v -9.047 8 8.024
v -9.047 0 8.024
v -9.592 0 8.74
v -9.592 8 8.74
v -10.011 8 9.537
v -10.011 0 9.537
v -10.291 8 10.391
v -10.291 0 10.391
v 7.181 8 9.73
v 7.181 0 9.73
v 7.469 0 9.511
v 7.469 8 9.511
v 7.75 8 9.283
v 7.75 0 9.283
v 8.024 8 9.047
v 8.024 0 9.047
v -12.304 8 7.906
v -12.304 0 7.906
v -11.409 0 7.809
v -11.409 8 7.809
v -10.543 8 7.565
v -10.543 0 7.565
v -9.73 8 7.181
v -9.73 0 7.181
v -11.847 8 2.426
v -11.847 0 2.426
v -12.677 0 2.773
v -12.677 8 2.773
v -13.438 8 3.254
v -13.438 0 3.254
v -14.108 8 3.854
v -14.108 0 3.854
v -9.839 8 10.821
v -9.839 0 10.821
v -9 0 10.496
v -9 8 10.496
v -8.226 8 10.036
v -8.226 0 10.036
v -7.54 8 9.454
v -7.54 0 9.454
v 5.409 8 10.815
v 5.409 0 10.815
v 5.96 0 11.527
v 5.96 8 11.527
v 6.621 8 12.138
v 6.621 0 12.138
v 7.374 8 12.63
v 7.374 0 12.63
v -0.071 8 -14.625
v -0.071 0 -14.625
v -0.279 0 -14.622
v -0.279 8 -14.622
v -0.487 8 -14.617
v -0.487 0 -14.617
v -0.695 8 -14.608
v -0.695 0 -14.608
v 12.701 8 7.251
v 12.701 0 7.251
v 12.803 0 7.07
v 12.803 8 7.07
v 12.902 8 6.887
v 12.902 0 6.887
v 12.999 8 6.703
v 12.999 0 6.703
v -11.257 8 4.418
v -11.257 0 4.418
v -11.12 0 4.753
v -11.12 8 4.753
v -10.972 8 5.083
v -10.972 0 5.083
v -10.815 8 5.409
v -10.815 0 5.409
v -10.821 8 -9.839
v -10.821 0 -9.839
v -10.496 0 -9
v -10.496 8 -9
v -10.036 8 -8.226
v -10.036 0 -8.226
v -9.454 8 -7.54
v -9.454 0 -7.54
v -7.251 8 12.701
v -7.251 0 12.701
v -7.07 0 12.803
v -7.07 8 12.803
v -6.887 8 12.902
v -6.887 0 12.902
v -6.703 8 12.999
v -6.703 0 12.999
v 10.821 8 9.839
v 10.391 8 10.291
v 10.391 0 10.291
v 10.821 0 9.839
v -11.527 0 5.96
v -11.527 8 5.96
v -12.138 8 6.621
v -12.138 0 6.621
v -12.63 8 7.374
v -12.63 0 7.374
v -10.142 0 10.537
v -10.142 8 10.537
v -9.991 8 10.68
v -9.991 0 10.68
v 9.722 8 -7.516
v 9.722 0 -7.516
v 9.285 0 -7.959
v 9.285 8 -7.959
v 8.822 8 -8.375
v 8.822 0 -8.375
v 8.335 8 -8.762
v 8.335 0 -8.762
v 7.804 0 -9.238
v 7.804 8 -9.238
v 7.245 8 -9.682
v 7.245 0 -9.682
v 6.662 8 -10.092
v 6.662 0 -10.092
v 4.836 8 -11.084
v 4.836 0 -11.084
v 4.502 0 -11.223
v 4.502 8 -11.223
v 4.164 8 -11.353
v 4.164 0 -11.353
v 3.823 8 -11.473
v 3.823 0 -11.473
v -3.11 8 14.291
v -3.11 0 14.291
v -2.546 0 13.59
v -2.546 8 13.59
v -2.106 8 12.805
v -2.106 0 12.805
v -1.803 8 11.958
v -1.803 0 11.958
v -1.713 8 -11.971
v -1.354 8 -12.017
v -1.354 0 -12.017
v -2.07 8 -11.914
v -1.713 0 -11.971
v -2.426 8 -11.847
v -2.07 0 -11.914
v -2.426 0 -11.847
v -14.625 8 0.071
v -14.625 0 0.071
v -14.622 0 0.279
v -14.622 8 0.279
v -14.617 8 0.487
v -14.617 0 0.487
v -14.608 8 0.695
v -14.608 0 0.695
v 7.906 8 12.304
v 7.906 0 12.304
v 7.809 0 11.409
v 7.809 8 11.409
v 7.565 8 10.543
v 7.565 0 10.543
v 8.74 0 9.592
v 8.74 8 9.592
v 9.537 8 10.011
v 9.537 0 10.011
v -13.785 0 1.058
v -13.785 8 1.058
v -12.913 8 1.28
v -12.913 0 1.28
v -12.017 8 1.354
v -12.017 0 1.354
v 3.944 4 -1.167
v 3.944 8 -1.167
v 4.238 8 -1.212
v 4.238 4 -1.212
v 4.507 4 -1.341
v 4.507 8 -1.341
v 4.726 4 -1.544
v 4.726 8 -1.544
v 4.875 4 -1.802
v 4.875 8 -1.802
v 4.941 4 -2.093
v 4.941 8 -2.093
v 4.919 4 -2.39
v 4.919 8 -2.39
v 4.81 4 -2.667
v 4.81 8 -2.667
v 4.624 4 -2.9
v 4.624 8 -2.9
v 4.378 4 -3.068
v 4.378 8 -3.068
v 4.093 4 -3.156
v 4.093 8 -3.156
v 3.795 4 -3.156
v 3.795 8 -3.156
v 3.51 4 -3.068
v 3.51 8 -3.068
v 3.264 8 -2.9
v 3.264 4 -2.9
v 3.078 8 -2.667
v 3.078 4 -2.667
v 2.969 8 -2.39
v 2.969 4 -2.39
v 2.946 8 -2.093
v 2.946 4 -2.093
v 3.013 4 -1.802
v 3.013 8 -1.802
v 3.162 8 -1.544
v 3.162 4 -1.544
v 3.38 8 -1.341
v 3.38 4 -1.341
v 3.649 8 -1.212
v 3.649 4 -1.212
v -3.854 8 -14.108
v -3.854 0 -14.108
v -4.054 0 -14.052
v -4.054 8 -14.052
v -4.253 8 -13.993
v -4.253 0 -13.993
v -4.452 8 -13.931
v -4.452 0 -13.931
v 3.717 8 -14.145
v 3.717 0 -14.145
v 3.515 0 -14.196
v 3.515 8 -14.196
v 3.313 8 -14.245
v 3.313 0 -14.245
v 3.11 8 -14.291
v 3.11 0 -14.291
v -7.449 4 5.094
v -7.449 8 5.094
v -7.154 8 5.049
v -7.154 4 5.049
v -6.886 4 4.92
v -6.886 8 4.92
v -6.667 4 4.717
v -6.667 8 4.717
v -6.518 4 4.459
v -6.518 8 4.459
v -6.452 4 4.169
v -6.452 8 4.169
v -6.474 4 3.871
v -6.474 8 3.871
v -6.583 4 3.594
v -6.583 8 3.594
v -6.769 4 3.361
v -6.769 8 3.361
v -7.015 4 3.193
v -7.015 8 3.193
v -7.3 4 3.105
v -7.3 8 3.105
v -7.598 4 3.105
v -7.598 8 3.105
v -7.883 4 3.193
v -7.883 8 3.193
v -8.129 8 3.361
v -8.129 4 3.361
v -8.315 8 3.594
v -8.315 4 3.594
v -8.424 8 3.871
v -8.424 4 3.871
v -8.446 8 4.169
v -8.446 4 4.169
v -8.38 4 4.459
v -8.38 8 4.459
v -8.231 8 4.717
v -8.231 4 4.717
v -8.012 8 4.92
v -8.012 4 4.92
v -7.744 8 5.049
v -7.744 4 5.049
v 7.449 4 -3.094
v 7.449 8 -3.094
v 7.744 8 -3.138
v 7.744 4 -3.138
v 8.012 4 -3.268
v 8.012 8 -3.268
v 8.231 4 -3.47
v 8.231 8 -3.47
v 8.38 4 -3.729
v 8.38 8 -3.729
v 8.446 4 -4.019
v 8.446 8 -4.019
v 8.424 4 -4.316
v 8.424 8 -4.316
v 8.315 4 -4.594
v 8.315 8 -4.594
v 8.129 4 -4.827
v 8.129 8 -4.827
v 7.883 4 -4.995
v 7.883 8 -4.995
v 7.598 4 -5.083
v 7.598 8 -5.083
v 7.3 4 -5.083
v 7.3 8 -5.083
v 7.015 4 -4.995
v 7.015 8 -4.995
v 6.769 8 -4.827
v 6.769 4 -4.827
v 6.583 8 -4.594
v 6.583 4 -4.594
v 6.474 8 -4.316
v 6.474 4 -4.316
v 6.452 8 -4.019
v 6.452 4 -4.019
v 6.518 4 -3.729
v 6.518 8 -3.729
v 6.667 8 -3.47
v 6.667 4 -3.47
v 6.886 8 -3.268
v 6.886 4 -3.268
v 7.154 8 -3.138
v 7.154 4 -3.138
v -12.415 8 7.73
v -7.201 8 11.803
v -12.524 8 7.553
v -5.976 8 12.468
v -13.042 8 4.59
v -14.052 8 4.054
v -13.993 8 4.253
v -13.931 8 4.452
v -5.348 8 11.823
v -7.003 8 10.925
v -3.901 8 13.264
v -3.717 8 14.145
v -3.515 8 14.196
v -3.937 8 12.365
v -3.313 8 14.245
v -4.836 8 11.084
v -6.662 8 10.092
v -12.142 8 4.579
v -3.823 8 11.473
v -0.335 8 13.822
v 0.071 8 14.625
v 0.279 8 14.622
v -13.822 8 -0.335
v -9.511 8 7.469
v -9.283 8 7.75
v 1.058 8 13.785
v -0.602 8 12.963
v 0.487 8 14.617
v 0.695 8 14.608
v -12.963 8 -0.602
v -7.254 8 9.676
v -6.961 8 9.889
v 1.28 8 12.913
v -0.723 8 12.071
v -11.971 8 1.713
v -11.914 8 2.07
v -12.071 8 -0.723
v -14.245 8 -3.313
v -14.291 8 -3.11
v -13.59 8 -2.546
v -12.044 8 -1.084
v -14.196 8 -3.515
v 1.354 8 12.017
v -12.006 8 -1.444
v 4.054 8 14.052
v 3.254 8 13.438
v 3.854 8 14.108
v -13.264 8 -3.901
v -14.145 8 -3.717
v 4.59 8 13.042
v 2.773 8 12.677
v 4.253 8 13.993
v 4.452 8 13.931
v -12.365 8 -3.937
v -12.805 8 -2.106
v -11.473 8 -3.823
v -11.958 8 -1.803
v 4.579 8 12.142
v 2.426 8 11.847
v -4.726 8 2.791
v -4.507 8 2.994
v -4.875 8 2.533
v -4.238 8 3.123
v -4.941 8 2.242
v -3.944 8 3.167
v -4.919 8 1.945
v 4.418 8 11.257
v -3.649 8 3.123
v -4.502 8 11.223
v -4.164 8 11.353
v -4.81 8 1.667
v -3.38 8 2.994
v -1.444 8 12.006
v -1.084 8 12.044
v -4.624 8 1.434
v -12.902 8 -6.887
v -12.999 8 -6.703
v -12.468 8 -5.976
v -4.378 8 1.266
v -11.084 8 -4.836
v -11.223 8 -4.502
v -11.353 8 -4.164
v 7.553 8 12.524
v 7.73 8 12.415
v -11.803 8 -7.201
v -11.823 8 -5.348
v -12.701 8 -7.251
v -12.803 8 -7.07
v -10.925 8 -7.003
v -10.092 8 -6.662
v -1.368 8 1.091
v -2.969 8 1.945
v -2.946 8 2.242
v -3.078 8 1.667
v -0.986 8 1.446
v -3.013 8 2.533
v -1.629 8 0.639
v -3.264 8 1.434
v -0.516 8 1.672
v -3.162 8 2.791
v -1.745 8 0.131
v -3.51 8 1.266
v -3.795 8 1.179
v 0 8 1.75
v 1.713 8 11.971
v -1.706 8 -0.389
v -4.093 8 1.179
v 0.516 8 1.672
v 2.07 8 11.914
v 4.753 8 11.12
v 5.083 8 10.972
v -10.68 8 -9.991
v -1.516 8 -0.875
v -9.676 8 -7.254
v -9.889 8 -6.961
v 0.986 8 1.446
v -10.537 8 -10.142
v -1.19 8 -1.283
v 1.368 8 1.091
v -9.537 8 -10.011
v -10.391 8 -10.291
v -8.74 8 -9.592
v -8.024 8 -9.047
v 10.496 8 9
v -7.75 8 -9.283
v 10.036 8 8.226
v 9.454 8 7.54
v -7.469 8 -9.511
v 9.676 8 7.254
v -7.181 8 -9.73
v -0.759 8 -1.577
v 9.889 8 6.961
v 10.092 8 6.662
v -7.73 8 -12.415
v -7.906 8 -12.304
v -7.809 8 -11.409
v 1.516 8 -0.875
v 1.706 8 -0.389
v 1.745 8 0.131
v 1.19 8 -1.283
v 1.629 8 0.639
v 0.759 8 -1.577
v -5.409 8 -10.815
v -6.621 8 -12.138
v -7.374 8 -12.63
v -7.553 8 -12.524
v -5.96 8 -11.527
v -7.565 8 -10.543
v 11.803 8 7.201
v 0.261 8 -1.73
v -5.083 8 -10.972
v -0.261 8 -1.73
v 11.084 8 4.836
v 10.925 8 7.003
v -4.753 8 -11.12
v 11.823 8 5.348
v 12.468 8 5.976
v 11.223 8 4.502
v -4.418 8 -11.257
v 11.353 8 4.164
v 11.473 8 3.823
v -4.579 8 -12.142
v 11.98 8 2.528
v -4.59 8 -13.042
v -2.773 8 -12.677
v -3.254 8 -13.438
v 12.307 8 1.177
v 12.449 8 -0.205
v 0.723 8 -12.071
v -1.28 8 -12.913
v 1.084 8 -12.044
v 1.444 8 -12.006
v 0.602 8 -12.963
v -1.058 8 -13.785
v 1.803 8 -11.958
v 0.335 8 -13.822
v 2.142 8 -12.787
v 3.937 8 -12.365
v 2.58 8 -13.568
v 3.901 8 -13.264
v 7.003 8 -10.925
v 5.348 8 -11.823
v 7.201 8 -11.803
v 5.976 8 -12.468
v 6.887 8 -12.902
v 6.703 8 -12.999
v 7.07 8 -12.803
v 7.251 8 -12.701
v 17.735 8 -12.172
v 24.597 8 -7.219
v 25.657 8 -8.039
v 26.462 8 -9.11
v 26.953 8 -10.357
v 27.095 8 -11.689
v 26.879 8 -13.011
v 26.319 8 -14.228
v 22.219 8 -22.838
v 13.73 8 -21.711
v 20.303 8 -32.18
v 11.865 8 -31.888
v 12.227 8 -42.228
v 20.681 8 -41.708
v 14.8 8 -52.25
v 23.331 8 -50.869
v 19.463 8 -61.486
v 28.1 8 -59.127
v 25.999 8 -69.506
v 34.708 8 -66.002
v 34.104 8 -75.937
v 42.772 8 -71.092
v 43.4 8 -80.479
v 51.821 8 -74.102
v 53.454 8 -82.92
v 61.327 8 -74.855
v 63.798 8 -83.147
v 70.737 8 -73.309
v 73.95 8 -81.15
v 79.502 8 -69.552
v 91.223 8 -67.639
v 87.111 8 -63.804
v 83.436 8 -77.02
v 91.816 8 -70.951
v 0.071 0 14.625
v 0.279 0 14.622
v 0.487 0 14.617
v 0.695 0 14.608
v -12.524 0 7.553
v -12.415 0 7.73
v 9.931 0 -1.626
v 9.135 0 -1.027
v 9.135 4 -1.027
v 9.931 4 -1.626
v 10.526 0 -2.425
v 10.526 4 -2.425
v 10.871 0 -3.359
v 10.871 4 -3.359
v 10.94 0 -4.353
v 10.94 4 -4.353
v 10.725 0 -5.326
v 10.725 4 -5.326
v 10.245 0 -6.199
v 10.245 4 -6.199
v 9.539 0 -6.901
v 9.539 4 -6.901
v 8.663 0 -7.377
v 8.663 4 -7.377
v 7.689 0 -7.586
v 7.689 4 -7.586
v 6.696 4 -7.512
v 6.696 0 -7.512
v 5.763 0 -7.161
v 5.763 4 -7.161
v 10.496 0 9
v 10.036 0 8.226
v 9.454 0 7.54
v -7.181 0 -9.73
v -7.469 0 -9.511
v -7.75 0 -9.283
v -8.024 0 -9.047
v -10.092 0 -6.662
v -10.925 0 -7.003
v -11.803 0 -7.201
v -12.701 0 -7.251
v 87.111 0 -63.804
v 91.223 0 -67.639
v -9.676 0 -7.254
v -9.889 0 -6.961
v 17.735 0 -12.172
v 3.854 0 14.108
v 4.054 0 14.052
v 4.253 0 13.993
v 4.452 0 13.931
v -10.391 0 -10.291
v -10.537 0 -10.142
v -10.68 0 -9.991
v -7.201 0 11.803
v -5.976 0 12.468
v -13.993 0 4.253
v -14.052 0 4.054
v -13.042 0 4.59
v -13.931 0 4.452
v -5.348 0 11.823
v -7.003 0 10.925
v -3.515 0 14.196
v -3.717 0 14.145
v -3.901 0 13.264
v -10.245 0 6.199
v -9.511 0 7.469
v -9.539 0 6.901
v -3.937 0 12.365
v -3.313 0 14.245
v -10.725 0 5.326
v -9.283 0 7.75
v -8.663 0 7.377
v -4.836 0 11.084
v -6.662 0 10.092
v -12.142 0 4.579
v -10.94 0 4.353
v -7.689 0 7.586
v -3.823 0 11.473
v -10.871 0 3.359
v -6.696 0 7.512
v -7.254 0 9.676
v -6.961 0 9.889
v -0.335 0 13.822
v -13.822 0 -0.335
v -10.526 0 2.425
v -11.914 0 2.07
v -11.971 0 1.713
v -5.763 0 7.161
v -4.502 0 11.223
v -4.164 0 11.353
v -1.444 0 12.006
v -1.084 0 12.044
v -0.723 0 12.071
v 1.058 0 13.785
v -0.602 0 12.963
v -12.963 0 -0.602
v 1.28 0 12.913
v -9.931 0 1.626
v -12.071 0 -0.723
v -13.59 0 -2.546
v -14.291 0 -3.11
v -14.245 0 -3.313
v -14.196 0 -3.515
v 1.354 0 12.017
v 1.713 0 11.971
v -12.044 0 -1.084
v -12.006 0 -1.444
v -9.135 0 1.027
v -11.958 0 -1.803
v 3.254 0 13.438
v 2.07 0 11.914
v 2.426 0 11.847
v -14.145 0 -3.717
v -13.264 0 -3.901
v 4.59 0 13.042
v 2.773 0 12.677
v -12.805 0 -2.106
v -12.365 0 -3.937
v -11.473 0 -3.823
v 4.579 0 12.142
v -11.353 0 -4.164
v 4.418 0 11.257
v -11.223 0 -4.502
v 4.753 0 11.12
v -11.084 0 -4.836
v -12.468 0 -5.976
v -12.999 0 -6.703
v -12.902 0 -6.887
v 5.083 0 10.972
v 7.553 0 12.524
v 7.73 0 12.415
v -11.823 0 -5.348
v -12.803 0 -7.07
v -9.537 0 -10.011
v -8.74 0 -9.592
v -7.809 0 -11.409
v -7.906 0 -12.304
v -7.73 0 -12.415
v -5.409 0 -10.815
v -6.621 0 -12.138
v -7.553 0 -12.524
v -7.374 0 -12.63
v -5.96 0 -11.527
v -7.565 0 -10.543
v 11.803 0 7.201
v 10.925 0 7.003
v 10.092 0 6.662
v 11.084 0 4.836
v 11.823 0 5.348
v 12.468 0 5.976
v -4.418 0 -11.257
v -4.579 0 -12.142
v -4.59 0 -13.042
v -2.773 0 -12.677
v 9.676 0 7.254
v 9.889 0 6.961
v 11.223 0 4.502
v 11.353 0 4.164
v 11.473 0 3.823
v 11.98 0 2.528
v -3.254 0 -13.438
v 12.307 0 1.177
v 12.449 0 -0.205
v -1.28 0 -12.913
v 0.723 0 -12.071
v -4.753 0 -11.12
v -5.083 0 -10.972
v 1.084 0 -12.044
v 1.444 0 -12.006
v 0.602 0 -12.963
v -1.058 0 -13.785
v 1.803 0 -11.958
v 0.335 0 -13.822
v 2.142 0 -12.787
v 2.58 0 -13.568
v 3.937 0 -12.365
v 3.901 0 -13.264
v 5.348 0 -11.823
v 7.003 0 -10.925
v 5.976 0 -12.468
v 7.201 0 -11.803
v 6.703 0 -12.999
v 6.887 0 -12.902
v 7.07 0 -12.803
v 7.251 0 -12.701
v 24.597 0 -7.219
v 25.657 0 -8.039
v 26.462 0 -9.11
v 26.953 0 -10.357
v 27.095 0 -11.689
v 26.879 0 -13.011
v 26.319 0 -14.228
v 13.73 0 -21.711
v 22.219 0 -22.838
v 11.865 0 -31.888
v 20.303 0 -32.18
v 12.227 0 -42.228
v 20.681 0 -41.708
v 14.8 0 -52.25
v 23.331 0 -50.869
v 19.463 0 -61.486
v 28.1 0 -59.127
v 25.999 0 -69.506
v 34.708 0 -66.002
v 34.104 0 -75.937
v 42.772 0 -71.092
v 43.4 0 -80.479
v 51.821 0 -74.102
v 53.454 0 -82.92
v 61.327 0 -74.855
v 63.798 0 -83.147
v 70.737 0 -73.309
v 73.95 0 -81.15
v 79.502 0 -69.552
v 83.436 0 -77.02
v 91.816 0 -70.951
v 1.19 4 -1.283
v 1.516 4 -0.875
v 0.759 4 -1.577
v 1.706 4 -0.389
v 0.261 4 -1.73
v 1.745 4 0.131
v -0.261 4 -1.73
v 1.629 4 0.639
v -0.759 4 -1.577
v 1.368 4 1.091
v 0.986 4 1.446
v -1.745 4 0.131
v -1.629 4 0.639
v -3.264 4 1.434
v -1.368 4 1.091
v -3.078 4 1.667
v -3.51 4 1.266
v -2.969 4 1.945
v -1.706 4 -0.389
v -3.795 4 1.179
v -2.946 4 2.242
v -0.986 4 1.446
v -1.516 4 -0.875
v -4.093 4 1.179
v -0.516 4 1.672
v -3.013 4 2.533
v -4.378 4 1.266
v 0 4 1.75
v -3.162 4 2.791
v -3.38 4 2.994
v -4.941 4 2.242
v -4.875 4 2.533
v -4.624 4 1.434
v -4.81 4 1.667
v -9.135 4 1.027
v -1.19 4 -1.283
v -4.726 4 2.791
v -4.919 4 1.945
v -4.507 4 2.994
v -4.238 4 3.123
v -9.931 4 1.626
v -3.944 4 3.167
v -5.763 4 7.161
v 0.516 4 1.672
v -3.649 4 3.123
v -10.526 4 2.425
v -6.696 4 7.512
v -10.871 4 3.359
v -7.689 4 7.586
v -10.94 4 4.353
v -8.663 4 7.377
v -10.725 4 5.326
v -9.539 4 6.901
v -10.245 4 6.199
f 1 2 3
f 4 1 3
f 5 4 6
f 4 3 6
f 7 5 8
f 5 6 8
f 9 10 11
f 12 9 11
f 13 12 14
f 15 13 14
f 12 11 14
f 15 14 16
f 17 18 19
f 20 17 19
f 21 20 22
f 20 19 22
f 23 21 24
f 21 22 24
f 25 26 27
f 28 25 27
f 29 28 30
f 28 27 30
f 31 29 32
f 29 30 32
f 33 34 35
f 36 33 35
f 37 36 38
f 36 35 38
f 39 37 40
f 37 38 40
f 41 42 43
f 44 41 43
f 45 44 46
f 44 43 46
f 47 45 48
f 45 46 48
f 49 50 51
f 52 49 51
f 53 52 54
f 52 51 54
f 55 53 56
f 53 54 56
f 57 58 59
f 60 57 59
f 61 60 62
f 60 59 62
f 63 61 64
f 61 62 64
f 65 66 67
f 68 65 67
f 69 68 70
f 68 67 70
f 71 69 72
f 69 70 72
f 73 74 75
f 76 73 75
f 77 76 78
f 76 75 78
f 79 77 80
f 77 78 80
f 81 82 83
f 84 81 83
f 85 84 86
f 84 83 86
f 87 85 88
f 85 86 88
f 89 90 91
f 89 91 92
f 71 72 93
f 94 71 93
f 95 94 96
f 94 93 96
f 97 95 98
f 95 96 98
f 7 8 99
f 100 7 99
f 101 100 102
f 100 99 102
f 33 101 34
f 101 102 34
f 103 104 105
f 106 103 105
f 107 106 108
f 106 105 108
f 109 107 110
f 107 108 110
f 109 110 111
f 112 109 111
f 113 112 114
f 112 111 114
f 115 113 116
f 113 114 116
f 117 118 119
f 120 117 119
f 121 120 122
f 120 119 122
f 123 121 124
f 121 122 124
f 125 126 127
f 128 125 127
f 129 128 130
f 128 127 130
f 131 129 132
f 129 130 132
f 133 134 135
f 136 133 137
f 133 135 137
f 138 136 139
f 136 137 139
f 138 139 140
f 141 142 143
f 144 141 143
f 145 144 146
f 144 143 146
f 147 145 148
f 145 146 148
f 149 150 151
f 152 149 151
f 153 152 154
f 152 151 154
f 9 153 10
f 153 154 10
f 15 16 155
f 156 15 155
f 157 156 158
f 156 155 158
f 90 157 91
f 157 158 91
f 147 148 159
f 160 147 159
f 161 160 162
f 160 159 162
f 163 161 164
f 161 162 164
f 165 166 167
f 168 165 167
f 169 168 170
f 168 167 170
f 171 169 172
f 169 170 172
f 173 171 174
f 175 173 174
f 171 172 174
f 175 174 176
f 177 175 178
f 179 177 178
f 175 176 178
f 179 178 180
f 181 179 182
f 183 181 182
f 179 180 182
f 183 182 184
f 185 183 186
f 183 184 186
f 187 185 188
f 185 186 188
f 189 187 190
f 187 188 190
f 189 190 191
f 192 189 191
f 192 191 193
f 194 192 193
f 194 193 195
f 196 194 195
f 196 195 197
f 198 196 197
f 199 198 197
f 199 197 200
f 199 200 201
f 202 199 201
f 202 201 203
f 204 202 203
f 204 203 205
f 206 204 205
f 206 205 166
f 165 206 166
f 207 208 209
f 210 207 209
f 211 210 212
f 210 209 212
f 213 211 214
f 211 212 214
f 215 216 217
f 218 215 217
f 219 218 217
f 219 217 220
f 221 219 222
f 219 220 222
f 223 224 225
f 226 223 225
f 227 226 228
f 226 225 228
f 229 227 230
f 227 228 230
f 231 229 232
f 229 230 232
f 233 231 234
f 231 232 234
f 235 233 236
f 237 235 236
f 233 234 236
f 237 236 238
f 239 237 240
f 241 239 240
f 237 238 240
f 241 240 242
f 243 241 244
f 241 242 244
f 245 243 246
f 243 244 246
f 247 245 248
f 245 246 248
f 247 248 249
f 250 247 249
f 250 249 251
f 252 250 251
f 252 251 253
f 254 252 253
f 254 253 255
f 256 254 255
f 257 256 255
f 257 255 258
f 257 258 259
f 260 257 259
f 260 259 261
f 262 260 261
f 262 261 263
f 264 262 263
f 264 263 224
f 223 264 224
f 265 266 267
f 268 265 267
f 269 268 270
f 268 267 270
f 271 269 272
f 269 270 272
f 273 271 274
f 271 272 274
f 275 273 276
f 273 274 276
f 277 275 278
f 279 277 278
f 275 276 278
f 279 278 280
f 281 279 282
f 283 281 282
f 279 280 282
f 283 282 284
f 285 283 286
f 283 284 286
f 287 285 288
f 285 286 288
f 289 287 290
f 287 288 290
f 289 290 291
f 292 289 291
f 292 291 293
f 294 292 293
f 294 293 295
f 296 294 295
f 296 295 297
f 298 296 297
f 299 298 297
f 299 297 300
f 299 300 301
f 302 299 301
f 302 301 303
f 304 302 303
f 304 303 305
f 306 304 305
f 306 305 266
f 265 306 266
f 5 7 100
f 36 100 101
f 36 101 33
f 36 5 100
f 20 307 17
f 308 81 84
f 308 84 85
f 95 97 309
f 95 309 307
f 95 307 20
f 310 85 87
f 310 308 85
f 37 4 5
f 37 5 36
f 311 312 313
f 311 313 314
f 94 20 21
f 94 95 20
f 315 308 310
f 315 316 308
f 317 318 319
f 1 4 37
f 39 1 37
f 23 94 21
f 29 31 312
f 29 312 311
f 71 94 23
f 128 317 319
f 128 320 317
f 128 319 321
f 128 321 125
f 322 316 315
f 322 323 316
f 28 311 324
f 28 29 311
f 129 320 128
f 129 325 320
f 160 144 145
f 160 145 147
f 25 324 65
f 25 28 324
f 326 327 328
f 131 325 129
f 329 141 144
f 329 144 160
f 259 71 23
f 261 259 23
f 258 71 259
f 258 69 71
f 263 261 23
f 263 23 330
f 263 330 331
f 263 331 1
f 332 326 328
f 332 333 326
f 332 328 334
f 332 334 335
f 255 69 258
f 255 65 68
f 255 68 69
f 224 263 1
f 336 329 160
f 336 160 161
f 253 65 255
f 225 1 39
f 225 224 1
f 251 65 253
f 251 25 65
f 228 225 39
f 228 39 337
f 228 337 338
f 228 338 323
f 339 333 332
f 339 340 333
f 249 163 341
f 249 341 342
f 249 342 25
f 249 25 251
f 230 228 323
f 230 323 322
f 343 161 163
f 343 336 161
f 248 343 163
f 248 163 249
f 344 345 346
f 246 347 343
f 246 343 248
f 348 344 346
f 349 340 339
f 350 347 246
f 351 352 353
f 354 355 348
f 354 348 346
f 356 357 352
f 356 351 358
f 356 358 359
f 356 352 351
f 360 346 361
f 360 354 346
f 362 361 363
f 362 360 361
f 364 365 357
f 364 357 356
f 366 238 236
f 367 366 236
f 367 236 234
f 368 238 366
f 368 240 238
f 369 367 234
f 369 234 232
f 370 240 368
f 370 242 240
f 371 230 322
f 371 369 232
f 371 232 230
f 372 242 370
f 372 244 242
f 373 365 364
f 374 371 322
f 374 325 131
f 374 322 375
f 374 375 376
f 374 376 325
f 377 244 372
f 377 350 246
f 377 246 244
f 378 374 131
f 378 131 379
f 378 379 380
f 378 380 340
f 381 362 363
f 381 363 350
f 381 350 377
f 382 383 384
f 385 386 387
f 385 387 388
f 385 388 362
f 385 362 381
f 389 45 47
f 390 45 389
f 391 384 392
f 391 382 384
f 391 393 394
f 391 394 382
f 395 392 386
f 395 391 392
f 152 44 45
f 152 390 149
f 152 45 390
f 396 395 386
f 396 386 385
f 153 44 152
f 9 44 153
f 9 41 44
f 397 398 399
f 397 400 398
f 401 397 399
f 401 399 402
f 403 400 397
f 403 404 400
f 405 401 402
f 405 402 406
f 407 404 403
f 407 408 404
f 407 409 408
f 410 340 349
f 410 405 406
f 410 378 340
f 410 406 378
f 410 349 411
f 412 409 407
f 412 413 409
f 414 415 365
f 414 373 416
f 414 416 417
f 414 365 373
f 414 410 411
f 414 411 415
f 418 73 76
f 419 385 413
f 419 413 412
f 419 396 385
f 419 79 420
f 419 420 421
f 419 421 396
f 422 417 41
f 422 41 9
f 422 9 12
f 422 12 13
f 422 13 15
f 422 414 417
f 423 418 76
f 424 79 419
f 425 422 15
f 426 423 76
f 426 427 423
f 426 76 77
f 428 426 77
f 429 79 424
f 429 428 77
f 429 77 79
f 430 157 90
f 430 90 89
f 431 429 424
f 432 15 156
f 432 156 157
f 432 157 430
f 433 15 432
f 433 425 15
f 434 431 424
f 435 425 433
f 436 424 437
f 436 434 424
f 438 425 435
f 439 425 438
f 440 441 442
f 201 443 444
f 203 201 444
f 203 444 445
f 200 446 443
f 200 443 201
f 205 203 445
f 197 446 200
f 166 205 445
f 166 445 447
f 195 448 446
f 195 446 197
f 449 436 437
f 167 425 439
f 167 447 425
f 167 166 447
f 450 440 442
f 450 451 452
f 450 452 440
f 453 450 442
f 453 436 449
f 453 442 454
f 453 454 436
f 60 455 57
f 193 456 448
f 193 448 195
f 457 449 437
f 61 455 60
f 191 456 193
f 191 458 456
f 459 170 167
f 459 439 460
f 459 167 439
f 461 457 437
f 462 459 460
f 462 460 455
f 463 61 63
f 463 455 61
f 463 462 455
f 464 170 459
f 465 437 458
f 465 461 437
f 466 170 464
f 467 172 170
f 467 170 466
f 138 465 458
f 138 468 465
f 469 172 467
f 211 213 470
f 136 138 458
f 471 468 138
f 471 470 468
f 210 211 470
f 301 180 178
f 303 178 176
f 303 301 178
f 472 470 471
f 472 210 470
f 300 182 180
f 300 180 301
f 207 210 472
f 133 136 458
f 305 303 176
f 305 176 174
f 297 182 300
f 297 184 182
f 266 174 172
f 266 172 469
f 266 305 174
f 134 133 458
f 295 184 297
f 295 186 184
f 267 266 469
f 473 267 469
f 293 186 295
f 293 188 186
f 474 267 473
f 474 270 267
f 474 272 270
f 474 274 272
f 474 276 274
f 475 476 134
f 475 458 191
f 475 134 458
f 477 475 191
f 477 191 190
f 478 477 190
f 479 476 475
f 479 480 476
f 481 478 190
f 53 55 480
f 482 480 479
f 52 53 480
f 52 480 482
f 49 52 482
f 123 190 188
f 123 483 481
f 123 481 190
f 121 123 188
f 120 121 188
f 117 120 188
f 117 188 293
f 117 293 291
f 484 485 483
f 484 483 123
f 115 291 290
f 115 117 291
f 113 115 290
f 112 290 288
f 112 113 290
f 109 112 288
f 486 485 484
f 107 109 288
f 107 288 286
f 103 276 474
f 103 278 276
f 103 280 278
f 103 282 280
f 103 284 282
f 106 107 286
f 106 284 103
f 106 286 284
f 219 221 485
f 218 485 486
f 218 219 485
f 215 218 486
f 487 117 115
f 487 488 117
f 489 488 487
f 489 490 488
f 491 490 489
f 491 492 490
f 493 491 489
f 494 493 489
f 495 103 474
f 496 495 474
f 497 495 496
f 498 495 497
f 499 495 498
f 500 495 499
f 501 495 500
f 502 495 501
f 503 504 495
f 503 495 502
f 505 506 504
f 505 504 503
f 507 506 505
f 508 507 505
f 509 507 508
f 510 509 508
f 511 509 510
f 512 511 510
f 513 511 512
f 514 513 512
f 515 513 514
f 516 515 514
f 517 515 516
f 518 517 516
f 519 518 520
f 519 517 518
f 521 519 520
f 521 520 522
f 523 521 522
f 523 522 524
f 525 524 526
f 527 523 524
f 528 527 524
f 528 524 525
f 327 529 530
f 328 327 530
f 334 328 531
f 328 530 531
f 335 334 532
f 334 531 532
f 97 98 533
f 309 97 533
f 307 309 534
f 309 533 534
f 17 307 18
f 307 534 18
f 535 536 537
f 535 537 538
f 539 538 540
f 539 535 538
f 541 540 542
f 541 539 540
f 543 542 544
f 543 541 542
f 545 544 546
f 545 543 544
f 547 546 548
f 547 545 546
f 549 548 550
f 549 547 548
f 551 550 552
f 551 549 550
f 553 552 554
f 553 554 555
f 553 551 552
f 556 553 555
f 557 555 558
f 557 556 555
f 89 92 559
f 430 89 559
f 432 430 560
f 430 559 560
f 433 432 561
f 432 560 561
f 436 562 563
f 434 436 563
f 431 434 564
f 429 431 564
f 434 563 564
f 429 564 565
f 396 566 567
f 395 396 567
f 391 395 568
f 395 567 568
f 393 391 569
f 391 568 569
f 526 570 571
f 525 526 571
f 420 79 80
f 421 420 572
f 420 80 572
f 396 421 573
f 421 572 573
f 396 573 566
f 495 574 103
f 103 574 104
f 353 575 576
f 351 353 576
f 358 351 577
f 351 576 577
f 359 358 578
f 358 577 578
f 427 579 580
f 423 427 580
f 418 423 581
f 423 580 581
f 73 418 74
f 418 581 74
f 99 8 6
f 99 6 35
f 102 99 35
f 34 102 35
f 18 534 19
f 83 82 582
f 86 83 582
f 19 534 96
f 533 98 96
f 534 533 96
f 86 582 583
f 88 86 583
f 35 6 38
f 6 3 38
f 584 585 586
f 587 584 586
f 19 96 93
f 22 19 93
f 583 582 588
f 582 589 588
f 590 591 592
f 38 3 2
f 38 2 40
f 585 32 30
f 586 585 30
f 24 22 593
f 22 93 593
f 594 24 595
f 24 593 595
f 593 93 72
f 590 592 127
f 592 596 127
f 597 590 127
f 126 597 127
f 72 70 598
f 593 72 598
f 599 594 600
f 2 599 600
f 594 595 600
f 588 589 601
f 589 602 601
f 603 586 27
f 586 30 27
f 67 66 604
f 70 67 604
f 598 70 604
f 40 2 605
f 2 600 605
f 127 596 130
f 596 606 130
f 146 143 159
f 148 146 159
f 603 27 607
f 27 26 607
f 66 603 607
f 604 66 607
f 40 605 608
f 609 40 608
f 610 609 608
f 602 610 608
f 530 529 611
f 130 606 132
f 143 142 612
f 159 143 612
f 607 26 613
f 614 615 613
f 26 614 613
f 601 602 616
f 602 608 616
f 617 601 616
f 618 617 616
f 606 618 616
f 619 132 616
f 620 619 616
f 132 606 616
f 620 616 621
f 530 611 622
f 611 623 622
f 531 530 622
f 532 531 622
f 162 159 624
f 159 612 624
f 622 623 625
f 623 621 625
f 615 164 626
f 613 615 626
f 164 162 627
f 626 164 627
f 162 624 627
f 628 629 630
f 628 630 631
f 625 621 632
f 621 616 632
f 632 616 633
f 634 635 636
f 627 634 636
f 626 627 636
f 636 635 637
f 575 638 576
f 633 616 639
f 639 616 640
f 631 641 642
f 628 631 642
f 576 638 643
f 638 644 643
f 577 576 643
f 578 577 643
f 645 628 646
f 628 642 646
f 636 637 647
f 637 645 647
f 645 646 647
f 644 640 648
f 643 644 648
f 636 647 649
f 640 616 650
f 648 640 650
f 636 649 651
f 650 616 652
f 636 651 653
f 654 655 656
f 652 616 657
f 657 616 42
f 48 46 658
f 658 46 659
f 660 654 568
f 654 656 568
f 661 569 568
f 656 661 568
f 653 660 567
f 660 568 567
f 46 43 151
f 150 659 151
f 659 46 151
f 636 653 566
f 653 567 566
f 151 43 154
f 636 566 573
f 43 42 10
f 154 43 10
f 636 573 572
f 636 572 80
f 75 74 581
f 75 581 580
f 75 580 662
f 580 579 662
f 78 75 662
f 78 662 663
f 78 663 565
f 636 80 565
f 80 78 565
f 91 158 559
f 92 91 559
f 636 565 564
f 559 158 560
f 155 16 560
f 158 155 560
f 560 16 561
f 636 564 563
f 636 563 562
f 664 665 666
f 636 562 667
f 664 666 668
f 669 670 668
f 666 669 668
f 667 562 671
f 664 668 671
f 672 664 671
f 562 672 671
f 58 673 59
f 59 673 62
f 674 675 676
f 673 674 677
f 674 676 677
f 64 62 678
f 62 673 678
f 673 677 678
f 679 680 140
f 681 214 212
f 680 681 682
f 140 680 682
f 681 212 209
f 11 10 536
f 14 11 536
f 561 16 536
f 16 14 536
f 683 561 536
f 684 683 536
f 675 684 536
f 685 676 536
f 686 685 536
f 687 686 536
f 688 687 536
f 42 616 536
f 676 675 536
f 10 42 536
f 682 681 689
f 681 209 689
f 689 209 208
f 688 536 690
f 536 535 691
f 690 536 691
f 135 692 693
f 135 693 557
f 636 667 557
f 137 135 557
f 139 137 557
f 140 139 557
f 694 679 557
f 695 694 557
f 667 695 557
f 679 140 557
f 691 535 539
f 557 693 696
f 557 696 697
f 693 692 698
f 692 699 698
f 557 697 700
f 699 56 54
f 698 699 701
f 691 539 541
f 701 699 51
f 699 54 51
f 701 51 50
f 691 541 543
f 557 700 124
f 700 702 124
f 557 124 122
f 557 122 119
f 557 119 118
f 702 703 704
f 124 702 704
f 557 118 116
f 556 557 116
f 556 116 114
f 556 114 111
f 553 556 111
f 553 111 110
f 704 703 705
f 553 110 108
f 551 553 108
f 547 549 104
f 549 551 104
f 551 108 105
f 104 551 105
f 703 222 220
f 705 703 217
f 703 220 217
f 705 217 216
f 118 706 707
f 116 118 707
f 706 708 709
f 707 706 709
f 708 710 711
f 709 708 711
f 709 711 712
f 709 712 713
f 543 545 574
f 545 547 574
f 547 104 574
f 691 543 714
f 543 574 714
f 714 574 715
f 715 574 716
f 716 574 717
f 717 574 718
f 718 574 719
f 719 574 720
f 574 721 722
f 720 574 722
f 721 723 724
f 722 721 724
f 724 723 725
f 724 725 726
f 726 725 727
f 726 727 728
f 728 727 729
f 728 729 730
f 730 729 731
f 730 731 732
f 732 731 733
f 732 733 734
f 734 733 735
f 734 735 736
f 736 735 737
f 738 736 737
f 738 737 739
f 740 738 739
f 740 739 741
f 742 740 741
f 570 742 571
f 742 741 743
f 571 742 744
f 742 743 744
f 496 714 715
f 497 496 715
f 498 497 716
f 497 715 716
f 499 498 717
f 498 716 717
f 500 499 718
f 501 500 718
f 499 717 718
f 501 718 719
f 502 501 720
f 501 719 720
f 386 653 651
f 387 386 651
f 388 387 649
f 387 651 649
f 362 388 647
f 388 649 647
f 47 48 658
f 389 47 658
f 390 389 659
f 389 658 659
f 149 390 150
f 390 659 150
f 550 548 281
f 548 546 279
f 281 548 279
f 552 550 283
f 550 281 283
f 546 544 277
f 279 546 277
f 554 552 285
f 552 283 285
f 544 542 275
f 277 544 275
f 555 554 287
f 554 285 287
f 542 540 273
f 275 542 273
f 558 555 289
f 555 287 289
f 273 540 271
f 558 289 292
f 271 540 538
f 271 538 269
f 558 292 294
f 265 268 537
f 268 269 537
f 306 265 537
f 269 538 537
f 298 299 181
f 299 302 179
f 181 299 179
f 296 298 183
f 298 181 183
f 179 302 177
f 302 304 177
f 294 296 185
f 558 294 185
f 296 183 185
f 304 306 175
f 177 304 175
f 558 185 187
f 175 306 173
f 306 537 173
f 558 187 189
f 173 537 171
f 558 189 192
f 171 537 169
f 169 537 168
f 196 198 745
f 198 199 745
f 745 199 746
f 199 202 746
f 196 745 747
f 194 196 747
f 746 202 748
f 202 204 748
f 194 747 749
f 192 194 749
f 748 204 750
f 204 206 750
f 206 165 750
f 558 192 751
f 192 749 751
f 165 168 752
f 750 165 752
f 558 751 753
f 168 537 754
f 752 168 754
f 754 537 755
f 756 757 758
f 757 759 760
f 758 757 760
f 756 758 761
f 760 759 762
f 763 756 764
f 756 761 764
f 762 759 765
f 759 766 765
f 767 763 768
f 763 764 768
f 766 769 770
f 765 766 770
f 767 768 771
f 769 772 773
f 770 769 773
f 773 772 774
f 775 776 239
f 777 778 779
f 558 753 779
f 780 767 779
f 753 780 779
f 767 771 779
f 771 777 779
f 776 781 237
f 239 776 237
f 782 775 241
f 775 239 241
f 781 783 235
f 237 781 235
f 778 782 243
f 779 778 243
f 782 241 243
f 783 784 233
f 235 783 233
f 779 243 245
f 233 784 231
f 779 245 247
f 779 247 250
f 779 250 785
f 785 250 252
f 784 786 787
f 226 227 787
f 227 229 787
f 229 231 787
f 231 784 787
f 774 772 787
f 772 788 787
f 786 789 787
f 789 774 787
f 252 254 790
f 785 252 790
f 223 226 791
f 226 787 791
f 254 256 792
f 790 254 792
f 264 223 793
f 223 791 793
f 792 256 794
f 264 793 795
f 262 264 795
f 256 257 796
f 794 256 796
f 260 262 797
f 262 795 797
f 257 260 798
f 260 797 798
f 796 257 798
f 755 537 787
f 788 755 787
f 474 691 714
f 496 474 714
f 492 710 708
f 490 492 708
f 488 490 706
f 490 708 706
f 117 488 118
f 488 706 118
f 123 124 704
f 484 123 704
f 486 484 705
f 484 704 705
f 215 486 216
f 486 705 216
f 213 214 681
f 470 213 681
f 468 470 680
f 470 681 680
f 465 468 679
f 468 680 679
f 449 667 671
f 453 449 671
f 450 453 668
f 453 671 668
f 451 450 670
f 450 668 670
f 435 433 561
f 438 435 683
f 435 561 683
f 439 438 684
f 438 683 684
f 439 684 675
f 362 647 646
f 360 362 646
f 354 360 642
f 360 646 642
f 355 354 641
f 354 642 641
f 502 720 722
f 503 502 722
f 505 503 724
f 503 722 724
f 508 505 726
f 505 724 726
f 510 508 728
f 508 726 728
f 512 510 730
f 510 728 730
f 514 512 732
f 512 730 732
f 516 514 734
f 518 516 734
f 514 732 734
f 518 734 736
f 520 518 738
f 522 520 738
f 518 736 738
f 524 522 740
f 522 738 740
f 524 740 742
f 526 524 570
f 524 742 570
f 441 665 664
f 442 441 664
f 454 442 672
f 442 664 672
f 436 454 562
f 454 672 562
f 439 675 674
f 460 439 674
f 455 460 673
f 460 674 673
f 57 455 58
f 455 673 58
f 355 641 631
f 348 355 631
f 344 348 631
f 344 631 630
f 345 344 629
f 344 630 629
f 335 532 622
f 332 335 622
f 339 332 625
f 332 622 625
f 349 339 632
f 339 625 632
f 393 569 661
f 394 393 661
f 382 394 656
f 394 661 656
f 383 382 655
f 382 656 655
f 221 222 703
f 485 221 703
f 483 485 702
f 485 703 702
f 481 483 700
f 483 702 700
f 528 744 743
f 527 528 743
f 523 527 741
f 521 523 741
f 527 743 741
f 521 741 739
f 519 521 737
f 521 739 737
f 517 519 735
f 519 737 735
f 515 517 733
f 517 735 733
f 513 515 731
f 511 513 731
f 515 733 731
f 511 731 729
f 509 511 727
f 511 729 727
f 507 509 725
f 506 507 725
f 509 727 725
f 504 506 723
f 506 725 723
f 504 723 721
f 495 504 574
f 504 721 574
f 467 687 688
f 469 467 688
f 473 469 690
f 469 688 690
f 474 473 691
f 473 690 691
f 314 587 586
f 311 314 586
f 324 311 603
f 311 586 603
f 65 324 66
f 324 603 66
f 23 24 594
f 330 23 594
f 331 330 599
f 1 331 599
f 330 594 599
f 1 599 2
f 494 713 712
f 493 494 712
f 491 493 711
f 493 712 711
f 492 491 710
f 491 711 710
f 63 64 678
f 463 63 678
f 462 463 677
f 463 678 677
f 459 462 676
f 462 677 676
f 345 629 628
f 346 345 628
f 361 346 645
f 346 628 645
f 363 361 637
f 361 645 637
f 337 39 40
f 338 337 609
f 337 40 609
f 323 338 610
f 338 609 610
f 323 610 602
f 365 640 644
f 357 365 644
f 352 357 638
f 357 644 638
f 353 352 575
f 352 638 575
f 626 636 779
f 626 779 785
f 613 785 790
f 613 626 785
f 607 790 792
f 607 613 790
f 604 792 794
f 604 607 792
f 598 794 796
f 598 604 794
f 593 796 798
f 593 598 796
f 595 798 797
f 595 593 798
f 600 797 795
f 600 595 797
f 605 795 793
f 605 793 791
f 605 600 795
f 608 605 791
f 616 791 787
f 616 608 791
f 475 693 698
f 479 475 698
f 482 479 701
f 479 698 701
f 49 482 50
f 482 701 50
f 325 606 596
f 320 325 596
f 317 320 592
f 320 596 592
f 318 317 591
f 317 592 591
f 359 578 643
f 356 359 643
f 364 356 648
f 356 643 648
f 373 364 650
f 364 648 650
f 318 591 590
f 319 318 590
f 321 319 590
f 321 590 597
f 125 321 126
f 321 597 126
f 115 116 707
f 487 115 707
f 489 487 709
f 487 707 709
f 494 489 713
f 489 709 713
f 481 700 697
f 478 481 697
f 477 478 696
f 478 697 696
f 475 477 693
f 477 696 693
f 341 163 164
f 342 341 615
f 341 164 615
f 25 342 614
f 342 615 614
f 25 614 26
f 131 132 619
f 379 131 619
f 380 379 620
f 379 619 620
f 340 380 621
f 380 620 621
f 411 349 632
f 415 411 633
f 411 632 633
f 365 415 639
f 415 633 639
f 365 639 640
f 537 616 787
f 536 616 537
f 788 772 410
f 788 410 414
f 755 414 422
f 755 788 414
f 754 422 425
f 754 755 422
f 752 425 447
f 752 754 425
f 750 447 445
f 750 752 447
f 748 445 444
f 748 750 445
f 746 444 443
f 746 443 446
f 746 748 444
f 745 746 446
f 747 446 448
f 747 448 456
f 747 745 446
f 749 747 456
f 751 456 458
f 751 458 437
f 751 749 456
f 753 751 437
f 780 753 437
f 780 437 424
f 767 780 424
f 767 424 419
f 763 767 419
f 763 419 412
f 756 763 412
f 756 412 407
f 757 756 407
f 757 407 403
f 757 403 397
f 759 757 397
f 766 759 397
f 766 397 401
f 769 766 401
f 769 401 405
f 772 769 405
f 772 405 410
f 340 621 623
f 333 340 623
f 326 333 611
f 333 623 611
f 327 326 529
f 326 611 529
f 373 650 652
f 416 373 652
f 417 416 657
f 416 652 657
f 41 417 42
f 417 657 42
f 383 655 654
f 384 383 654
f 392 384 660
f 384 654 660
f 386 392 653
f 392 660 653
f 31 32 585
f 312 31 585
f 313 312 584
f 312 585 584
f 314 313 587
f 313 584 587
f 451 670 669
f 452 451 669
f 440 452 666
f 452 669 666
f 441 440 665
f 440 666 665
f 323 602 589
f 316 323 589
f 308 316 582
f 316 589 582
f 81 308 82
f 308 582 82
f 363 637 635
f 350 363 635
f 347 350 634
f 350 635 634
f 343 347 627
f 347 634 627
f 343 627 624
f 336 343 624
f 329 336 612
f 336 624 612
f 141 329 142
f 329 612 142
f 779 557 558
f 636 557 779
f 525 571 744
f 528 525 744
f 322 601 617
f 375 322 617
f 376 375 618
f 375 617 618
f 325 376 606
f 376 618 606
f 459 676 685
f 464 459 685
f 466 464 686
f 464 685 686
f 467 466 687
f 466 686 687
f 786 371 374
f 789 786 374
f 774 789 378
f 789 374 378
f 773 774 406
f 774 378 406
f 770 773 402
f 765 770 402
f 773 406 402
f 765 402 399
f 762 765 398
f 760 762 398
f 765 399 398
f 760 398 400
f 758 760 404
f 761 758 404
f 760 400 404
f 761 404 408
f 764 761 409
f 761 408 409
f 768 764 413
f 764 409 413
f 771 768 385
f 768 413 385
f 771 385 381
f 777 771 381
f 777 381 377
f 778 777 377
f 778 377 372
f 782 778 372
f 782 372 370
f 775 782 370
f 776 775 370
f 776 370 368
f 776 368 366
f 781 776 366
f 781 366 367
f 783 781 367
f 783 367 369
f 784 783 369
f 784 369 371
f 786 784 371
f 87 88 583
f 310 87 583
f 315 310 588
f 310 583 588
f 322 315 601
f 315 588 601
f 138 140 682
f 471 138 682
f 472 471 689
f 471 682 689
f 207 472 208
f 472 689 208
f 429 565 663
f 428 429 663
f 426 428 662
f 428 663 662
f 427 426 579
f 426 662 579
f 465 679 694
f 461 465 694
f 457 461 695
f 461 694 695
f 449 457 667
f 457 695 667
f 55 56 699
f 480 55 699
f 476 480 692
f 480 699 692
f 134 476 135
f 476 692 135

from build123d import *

# Parameters (mm, degrees)
CROQUIS3_R              = 1.75
SALIENTE_EXTRUIR2_DEPTH = 8
CROQUIS4_R              = 1
CORTAR_EXTRUIR1_DEPTH   = 8
CORTAR_EXTRUIR2_DEPTH   = 4


with BuildPart() as part:
    # Croquis3 → Saliente-Extruir2 (new body)
    with BuildSketch(Plane(origin=(0, 0, 0), x_dir=(1, 0, 0), z_dir=(0, 1, 0))):
        with BuildLine():
            Line((87.111019212, 63.804032696), (91.223264764, 67.638763711))
            Line((91.223264764, 67.638763711), (91.815621149, 70.950831381))
            ThreePointArc((91.815621149, 70.950831381), (29.87732987, 72.940785596), (17.735388738, 12.171672472))
            Line((17.735388738, 12.171672472), (9.721894551, 7.515983209))
            ThreePointArc((9.721894551, 7.515983209), (9.056743368, 8.17044576), (8.33477019, 8.76163275))
            ThreePointArc((8.33477019, 8.76163275), (7.527702463, 9.464052948), (6.66170644, 10.092386728))
            ThreePointArc((6.66170644, 10.092386728), (7.120443737, 11.359558341), (7.251125308, 12.700858505))
            ThreePointArc((7.251125308, 12.700858505), (6.978446869, 12.852700273), (6.702590326, 12.9986887))
            ThreePointArc((6.702590326, 12.9986887), (5.648855639, 12.158565486), (4.835962342, 11.083684892))
            ThreePointArc((4.835962342, 11.083684892), (4.333654022, 11.289554703), (3.822612402, 11.472673489))
            ThreePointArc((3.822612402, 11.472673489), (3.937750458, 12.815397225), (3.716825134, 14.144816574))
            ThreePointArc((3.716825134, 14.144816574), (3.414138446, 14.220910086), (3.109896902, 14.290527151))
            ThreePointArc((3.109896902, 14.290527151), (2.349191787, 13.184063868), (1.802512181, 11.957656643))
            ThreePointArc((1.802512181, 11.957656643), (1.264036574, 12.02650465), (0.723013645, 12.071116511))
            ThreePointArc((0.723013645, 12.071116511), (0.486705992, 13.397887968), (-0.07077053, 14.624828769))
            ThreePointArc((-0.07077053, 14.624828769), (-0.382837869, 14.619988378), (-0.694730857, 14.608489793))
            ThreePointArc((-0.694730857, 14.608489793), (-1.187230257, 13.354054404), (-1.353776206, 12.016733855))
            ThreePointArc((-1.353776206, 12.016733855), (-1.891722877, 11.943868181), (-2.425857296, 11.846932892))
            ThreePointArc((-2.425857296, 11.846932892), (-2.997506682, 13.067334786), (-3.8535433, 14.108183052))
            ThreePointArc((-3.8535433, 14.108183052), (-4.153724416, 14.022738622), (-4.452013856, 13.930907997))
            ThreePointArc((-4.452013856, 13.930907997), (-4.603059976, 12.591748233), (-4.417806982, 11.256890513))
            ThreePointArc((-4.417806982, 11.256890513), (-4.918564541, 11.047276833), (-5.409410071, 10.815400374))
            ThreePointArc((-5.409410071, 10.815400374), (-6.27744423, 11.846264333), (-7.373703462, 12.630087975))
            ThreePointArc((-7.373703462, 12.630087975), (-7.641541509, 12.469862404), (-7.905899467, 12.303957843))
            ThreePointArc((-7.905899467, 12.303957843), (-7.705198765, 10.971335229), (-7.180771513, 9.729908686))
            ThreePointArc((-7.180771513, 9.729908686), (-7.610214159, 9.397831825), (-8.02432049, 9.046816193))
            ThreePointArc((-8.02432049, 9.046816193), (-9.129584328, 9.817890543), (-10.391357918, 10.291273275))
            ThreePointArc((-10.391357918, 10.291273275), (-10.608600176, 10.06718567), (-10.821011096, 9.838513296))
            ThreePointArc((-10.821011096, 9.838513296), (-10.282240991, 8.60324386), (-9.454378332, 7.539849661))
            ThreePointArc((-9.454378332, 7.539849661), (-9.783240259, 7.10794011), (-10.092386728, 6.66170644))
            ThreePointArc((-10.092386728, 6.66170644), (-11.359558341, 7.120443737), (-12.700858505, 7.251125308))
            ThreePointArc((-12.700858505, 7.251125308), (-12.852700273, 6.978446869), (-12.9986887, 6.702590326))
            ThreePointArc((-12.9986887, 6.702590326), (-12.158565486, 5.648855639), (-11.083684892, 4.835962342))
            ThreePointArc((-11.083684892, 4.835962342), (-11.289554703, 4.333654022), (-11.472673489, 3.822612402))
            ThreePointArc((-11.472673489, 3.822612402), (-12.815397225, 3.937750458), (-14.144816574, 3.716825134))
            ThreePointArc((-14.144816574, 3.716825134), (-14.220910086, 3.414138446), (-14.290527151, 3.109896902))
            ThreePointArc((-14.290527151, 3.109896902), (-13.206303836, 2.309507242), (-11.957656643, 1.802512181))
            ThreePointArc((-11.957656643, 1.802512181), (-12.02650465, 1.264036574), (-12.071116511, 0.723013645))
            ThreePointArc((-12.071116511, 0.723013645), (-13.397887968, 0.486705992), (-14.624828769, -0.07077053))
            ThreePointArc((-14.624828769, -0.07077053), (-14.619988378, -0.382837869), (-14.608489793, -0.694730857))
            ThreePointArc((-14.608489793, -0.694730857), (-13.354054404, -1.187230257), (-12.016733855, -1.353776206))
            ThreePointArc((-12.016733855, -1.353776206), (-11.943868181, -1.891722877), (-11.846932892, -2.425857296))
            ThreePointArc((-11.846932892, -2.425857296), (-13.067334786, -2.997506682), (-14.108183052, -3.8535433))
            ThreePointArc((-14.108183052, -3.8535433), (-14.022738622, -4.153724416), (-13.930907997, -4.452013856))
            ThreePointArc((-13.930907997, -4.452013856), (-12.591748233, -4.603059976), (-11.256890513, -4.417806982))
            ThreePointArc((-11.256890513, -4.417806982), (-11.047276833, -4.918564541), (-10.815400374, -5.409410071))
            ThreePointArc((-10.815400374, -5.409410071), (-11.846264333, -6.27744423), (-12.630087975, -7.373703462))
            ThreePointArc((-12.630087975, -7.373703462), (-12.469862404, -7.641541509), (-12.303957843, -7.905899467))
            ThreePointArc((-12.303957843, -7.905899467), (-10.971335229, -7.705198765), (-9.729908686, -7.180771513))
            ThreePointArc((-9.729908686, -7.180771513), (-9.397831825, -7.610214159), (-9.046816193, -8.02432049))
            ThreePointArc((-9.046816193, -8.02432049), (-9.817890543, -9.129584328), (-10.291273275, -10.391357918))
            ThreePointArc((-10.291273275, -10.391357918), (-10.06718567, -10.608600176), (-9.838513296, -10.821011096))
            ThreePointArc((-9.838513296, -10.821011096), (-8.60324386, -10.282240991), (-7.539849661, -9.454378332))
            ThreePointArc((-7.539849661, -9.454378332), (-7.10794011, -9.783240259), (-6.66170644, -10.092386728))
            ThreePointArc((-6.66170644, -10.092386728), (-7.120443737, -11.359558341), (-7.251125308, -12.700858505))
            ThreePointArc((-7.251125308, -12.700858505), (-6.978446869, -12.852700273), (-6.702590326, -12.9986887))
            ThreePointArc((-6.702590326, -12.9986887), (-5.648855639, -12.158565486), (-4.835962342, -11.083684892))
            ThreePointArc((-4.835962342, -11.083684892), (-4.333654022, -11.289554703), (-3.822612402, -11.472673489))
            ThreePointArc((-3.822612402, -11.472673489), (-3.937750458, -12.815397225), (-3.716825134, -14.144816574))
            ThreePointArc((-3.716825134, -14.144816574), (-3.414138446, -14.220910086), (-3.109896902, -14.290527151))
            ThreePointArc((-3.109896902, -14.290527151), (-2.309507242, -13.206303836), (-1.802512181, -11.957656643))
            ThreePointArc((-1.802512181, -11.957656643), (-1.264036574, -12.02650465), (-0.723013645, -12.071116511))
            ThreePointArc((-0.723013645, -12.071116511), (-0.486705992, -13.397887968), (0.07077053, -14.624828769))
            ThreePointArc((0.07077053, -14.624828769), (0.382837869, -14.619988378), (0.694730857, -14.608489793))
            ThreePointArc((0.694730857, -14.608489793), (1.187230257, -13.354054404), (1.353776206, -12.016733855))
            ThreePointArc((1.353776206, -12.016733855), (1.891722877, -11.943868181), (2.425857296, -11.846932892))
            ThreePointArc((2.425857296, -11.846932892), (2.997506682, -13.067334786), (3.8535433, -14.108183052))
            ThreePointArc((3.8535433, -14.108183052), (4.153724416, -14.022738622), (4.452013856, -13.930907997))
            ThreePointArc((4.452013856, -13.930907997), (4.603059976, -12.591748233), (4.417806982, -11.256890513))
            ThreePointArc((4.417806982, -11.256890513), (4.918564541, -11.047276833), (5.409410071, -10.815400374))
            ThreePointArc((5.409410071, -10.815400374), (6.27744423, -11.846264333), (7.373703462, -12.630087975))
            ThreePointArc((7.373703462, -12.630087975), (7.641541509, -12.469862404), (7.905899467, -12.303957843))
            ThreePointArc((7.905899467, -12.303957843), (7.705198765, -10.971335229), (7.180771513, -9.729908686))
            ThreePointArc((7.180771513, -9.729908686), (7.610214159, -9.397831825), (8.02432049, -9.046816193))
            ThreePointArc((8.02432049, -9.046816193), (9.129584328, -9.817890543), (10.391357918, -10.291273275))
            Line((10.391357918, -10.291273275), (10.821011096, -9.838513296))
            ThreePointArc((10.821011096, -9.838513296), (10.282240991, -8.60324386), (9.454378332, -7.539849661))
            ThreePointArc((9.454378332, -7.539849661), (9.783240259, -7.10794011), (10.092386728, -6.66170644))
            ThreePointArc((10.092386728, -6.66170644), (11.359558341, -7.120443737), (12.700858505, -7.251125308))
            ThreePointArc((12.700858505, -7.251125308), (12.852700273, -6.978446869), (12.9986887, -6.702590326))
            ThreePointArc((12.9986887, -6.702590326), (12.158565486, -5.648855639), (11.083684892, -4.835962342))
            ThreePointArc((11.083684892, -4.835962342), (11.289554703, -4.333654022), (11.472673489, -3.822612402))
            ThreePointArc((11.472673489, -3.822612402), (12.166604466, -1.858471402), (12.448632794, 0.205469027))
            Line((12.448632794, 0.205469027), (24.597080908, 7.219378816))
            ThreePointArc((24.597080908, 7.219378816), (26.952693775, 10.356600271), (26.318983455, 14.228225469))
            ThreePointArc((26.318983455, 14.228225469), (34.708358258, 66.001642936), (87.111019212, 63.804032696))
        make_face()
        with Locations(Location((0, 0, 0), (0, 0, 270))):
            Circle(CROQUIS3_R, mode=Mode.SUBTRACT)
    extrude(amount=SALIENTE_EXTRUIR2_DEPTH)

    # Croquis4 → Cortar-Extruir1 (cut)
    with BuildSketch(Plane(origin=(0, 8, 0), x_dir=(1, 0, 0), z_dir=(0, 1, 0))):
        with Locations(Location((3.943679518, 2.167346732, 0), (0, 0, 270))):
            Circle(CROQUIS4_R)
        with Locations(Location((-3.943679518, -2.167346732, 0), (0, 0, 270))):
            Circle(CROQUIS4_R)
        with Locations(Location((7.449172424, 4.09387716, 0), (0, 0, 270))):
            Circle(CROQUIS4_R)
        with Locations(Location((-7.449172424, -4.09387716, 0), (0, 0, 270))):
            Circle(CROQUIS4_R)
    extrude(amount=-CORTAR_EXTRUIR1_DEPTH, mode=Mode.SUBTRACT)

    # Croquis5 → Cortar-Extruir2 (cut)
    with BuildSketch(Plane.XZ):
        with BuildLine():
            Line((-5.763458299, 7.161183452), (9.134886548, -1.026570868))
            ThreePointArc((9.134886548, -1.026570868), (10.516478716, -5.779591285), (5.763458299, -7.161183452))
            Line((5.763458299, -7.161183452), (-9.134886548, 1.026570868))
            ThreePointArc((-9.134886548, 1.026570868), (-10.516478716, 5.779591285), (-5.763458299, 7.161183452))
        make_face()
    extrude(amount=-CORTAR_EXTRUIR2_DEPTH, mode=Mode.SUBTRACT)


solid = part.part
